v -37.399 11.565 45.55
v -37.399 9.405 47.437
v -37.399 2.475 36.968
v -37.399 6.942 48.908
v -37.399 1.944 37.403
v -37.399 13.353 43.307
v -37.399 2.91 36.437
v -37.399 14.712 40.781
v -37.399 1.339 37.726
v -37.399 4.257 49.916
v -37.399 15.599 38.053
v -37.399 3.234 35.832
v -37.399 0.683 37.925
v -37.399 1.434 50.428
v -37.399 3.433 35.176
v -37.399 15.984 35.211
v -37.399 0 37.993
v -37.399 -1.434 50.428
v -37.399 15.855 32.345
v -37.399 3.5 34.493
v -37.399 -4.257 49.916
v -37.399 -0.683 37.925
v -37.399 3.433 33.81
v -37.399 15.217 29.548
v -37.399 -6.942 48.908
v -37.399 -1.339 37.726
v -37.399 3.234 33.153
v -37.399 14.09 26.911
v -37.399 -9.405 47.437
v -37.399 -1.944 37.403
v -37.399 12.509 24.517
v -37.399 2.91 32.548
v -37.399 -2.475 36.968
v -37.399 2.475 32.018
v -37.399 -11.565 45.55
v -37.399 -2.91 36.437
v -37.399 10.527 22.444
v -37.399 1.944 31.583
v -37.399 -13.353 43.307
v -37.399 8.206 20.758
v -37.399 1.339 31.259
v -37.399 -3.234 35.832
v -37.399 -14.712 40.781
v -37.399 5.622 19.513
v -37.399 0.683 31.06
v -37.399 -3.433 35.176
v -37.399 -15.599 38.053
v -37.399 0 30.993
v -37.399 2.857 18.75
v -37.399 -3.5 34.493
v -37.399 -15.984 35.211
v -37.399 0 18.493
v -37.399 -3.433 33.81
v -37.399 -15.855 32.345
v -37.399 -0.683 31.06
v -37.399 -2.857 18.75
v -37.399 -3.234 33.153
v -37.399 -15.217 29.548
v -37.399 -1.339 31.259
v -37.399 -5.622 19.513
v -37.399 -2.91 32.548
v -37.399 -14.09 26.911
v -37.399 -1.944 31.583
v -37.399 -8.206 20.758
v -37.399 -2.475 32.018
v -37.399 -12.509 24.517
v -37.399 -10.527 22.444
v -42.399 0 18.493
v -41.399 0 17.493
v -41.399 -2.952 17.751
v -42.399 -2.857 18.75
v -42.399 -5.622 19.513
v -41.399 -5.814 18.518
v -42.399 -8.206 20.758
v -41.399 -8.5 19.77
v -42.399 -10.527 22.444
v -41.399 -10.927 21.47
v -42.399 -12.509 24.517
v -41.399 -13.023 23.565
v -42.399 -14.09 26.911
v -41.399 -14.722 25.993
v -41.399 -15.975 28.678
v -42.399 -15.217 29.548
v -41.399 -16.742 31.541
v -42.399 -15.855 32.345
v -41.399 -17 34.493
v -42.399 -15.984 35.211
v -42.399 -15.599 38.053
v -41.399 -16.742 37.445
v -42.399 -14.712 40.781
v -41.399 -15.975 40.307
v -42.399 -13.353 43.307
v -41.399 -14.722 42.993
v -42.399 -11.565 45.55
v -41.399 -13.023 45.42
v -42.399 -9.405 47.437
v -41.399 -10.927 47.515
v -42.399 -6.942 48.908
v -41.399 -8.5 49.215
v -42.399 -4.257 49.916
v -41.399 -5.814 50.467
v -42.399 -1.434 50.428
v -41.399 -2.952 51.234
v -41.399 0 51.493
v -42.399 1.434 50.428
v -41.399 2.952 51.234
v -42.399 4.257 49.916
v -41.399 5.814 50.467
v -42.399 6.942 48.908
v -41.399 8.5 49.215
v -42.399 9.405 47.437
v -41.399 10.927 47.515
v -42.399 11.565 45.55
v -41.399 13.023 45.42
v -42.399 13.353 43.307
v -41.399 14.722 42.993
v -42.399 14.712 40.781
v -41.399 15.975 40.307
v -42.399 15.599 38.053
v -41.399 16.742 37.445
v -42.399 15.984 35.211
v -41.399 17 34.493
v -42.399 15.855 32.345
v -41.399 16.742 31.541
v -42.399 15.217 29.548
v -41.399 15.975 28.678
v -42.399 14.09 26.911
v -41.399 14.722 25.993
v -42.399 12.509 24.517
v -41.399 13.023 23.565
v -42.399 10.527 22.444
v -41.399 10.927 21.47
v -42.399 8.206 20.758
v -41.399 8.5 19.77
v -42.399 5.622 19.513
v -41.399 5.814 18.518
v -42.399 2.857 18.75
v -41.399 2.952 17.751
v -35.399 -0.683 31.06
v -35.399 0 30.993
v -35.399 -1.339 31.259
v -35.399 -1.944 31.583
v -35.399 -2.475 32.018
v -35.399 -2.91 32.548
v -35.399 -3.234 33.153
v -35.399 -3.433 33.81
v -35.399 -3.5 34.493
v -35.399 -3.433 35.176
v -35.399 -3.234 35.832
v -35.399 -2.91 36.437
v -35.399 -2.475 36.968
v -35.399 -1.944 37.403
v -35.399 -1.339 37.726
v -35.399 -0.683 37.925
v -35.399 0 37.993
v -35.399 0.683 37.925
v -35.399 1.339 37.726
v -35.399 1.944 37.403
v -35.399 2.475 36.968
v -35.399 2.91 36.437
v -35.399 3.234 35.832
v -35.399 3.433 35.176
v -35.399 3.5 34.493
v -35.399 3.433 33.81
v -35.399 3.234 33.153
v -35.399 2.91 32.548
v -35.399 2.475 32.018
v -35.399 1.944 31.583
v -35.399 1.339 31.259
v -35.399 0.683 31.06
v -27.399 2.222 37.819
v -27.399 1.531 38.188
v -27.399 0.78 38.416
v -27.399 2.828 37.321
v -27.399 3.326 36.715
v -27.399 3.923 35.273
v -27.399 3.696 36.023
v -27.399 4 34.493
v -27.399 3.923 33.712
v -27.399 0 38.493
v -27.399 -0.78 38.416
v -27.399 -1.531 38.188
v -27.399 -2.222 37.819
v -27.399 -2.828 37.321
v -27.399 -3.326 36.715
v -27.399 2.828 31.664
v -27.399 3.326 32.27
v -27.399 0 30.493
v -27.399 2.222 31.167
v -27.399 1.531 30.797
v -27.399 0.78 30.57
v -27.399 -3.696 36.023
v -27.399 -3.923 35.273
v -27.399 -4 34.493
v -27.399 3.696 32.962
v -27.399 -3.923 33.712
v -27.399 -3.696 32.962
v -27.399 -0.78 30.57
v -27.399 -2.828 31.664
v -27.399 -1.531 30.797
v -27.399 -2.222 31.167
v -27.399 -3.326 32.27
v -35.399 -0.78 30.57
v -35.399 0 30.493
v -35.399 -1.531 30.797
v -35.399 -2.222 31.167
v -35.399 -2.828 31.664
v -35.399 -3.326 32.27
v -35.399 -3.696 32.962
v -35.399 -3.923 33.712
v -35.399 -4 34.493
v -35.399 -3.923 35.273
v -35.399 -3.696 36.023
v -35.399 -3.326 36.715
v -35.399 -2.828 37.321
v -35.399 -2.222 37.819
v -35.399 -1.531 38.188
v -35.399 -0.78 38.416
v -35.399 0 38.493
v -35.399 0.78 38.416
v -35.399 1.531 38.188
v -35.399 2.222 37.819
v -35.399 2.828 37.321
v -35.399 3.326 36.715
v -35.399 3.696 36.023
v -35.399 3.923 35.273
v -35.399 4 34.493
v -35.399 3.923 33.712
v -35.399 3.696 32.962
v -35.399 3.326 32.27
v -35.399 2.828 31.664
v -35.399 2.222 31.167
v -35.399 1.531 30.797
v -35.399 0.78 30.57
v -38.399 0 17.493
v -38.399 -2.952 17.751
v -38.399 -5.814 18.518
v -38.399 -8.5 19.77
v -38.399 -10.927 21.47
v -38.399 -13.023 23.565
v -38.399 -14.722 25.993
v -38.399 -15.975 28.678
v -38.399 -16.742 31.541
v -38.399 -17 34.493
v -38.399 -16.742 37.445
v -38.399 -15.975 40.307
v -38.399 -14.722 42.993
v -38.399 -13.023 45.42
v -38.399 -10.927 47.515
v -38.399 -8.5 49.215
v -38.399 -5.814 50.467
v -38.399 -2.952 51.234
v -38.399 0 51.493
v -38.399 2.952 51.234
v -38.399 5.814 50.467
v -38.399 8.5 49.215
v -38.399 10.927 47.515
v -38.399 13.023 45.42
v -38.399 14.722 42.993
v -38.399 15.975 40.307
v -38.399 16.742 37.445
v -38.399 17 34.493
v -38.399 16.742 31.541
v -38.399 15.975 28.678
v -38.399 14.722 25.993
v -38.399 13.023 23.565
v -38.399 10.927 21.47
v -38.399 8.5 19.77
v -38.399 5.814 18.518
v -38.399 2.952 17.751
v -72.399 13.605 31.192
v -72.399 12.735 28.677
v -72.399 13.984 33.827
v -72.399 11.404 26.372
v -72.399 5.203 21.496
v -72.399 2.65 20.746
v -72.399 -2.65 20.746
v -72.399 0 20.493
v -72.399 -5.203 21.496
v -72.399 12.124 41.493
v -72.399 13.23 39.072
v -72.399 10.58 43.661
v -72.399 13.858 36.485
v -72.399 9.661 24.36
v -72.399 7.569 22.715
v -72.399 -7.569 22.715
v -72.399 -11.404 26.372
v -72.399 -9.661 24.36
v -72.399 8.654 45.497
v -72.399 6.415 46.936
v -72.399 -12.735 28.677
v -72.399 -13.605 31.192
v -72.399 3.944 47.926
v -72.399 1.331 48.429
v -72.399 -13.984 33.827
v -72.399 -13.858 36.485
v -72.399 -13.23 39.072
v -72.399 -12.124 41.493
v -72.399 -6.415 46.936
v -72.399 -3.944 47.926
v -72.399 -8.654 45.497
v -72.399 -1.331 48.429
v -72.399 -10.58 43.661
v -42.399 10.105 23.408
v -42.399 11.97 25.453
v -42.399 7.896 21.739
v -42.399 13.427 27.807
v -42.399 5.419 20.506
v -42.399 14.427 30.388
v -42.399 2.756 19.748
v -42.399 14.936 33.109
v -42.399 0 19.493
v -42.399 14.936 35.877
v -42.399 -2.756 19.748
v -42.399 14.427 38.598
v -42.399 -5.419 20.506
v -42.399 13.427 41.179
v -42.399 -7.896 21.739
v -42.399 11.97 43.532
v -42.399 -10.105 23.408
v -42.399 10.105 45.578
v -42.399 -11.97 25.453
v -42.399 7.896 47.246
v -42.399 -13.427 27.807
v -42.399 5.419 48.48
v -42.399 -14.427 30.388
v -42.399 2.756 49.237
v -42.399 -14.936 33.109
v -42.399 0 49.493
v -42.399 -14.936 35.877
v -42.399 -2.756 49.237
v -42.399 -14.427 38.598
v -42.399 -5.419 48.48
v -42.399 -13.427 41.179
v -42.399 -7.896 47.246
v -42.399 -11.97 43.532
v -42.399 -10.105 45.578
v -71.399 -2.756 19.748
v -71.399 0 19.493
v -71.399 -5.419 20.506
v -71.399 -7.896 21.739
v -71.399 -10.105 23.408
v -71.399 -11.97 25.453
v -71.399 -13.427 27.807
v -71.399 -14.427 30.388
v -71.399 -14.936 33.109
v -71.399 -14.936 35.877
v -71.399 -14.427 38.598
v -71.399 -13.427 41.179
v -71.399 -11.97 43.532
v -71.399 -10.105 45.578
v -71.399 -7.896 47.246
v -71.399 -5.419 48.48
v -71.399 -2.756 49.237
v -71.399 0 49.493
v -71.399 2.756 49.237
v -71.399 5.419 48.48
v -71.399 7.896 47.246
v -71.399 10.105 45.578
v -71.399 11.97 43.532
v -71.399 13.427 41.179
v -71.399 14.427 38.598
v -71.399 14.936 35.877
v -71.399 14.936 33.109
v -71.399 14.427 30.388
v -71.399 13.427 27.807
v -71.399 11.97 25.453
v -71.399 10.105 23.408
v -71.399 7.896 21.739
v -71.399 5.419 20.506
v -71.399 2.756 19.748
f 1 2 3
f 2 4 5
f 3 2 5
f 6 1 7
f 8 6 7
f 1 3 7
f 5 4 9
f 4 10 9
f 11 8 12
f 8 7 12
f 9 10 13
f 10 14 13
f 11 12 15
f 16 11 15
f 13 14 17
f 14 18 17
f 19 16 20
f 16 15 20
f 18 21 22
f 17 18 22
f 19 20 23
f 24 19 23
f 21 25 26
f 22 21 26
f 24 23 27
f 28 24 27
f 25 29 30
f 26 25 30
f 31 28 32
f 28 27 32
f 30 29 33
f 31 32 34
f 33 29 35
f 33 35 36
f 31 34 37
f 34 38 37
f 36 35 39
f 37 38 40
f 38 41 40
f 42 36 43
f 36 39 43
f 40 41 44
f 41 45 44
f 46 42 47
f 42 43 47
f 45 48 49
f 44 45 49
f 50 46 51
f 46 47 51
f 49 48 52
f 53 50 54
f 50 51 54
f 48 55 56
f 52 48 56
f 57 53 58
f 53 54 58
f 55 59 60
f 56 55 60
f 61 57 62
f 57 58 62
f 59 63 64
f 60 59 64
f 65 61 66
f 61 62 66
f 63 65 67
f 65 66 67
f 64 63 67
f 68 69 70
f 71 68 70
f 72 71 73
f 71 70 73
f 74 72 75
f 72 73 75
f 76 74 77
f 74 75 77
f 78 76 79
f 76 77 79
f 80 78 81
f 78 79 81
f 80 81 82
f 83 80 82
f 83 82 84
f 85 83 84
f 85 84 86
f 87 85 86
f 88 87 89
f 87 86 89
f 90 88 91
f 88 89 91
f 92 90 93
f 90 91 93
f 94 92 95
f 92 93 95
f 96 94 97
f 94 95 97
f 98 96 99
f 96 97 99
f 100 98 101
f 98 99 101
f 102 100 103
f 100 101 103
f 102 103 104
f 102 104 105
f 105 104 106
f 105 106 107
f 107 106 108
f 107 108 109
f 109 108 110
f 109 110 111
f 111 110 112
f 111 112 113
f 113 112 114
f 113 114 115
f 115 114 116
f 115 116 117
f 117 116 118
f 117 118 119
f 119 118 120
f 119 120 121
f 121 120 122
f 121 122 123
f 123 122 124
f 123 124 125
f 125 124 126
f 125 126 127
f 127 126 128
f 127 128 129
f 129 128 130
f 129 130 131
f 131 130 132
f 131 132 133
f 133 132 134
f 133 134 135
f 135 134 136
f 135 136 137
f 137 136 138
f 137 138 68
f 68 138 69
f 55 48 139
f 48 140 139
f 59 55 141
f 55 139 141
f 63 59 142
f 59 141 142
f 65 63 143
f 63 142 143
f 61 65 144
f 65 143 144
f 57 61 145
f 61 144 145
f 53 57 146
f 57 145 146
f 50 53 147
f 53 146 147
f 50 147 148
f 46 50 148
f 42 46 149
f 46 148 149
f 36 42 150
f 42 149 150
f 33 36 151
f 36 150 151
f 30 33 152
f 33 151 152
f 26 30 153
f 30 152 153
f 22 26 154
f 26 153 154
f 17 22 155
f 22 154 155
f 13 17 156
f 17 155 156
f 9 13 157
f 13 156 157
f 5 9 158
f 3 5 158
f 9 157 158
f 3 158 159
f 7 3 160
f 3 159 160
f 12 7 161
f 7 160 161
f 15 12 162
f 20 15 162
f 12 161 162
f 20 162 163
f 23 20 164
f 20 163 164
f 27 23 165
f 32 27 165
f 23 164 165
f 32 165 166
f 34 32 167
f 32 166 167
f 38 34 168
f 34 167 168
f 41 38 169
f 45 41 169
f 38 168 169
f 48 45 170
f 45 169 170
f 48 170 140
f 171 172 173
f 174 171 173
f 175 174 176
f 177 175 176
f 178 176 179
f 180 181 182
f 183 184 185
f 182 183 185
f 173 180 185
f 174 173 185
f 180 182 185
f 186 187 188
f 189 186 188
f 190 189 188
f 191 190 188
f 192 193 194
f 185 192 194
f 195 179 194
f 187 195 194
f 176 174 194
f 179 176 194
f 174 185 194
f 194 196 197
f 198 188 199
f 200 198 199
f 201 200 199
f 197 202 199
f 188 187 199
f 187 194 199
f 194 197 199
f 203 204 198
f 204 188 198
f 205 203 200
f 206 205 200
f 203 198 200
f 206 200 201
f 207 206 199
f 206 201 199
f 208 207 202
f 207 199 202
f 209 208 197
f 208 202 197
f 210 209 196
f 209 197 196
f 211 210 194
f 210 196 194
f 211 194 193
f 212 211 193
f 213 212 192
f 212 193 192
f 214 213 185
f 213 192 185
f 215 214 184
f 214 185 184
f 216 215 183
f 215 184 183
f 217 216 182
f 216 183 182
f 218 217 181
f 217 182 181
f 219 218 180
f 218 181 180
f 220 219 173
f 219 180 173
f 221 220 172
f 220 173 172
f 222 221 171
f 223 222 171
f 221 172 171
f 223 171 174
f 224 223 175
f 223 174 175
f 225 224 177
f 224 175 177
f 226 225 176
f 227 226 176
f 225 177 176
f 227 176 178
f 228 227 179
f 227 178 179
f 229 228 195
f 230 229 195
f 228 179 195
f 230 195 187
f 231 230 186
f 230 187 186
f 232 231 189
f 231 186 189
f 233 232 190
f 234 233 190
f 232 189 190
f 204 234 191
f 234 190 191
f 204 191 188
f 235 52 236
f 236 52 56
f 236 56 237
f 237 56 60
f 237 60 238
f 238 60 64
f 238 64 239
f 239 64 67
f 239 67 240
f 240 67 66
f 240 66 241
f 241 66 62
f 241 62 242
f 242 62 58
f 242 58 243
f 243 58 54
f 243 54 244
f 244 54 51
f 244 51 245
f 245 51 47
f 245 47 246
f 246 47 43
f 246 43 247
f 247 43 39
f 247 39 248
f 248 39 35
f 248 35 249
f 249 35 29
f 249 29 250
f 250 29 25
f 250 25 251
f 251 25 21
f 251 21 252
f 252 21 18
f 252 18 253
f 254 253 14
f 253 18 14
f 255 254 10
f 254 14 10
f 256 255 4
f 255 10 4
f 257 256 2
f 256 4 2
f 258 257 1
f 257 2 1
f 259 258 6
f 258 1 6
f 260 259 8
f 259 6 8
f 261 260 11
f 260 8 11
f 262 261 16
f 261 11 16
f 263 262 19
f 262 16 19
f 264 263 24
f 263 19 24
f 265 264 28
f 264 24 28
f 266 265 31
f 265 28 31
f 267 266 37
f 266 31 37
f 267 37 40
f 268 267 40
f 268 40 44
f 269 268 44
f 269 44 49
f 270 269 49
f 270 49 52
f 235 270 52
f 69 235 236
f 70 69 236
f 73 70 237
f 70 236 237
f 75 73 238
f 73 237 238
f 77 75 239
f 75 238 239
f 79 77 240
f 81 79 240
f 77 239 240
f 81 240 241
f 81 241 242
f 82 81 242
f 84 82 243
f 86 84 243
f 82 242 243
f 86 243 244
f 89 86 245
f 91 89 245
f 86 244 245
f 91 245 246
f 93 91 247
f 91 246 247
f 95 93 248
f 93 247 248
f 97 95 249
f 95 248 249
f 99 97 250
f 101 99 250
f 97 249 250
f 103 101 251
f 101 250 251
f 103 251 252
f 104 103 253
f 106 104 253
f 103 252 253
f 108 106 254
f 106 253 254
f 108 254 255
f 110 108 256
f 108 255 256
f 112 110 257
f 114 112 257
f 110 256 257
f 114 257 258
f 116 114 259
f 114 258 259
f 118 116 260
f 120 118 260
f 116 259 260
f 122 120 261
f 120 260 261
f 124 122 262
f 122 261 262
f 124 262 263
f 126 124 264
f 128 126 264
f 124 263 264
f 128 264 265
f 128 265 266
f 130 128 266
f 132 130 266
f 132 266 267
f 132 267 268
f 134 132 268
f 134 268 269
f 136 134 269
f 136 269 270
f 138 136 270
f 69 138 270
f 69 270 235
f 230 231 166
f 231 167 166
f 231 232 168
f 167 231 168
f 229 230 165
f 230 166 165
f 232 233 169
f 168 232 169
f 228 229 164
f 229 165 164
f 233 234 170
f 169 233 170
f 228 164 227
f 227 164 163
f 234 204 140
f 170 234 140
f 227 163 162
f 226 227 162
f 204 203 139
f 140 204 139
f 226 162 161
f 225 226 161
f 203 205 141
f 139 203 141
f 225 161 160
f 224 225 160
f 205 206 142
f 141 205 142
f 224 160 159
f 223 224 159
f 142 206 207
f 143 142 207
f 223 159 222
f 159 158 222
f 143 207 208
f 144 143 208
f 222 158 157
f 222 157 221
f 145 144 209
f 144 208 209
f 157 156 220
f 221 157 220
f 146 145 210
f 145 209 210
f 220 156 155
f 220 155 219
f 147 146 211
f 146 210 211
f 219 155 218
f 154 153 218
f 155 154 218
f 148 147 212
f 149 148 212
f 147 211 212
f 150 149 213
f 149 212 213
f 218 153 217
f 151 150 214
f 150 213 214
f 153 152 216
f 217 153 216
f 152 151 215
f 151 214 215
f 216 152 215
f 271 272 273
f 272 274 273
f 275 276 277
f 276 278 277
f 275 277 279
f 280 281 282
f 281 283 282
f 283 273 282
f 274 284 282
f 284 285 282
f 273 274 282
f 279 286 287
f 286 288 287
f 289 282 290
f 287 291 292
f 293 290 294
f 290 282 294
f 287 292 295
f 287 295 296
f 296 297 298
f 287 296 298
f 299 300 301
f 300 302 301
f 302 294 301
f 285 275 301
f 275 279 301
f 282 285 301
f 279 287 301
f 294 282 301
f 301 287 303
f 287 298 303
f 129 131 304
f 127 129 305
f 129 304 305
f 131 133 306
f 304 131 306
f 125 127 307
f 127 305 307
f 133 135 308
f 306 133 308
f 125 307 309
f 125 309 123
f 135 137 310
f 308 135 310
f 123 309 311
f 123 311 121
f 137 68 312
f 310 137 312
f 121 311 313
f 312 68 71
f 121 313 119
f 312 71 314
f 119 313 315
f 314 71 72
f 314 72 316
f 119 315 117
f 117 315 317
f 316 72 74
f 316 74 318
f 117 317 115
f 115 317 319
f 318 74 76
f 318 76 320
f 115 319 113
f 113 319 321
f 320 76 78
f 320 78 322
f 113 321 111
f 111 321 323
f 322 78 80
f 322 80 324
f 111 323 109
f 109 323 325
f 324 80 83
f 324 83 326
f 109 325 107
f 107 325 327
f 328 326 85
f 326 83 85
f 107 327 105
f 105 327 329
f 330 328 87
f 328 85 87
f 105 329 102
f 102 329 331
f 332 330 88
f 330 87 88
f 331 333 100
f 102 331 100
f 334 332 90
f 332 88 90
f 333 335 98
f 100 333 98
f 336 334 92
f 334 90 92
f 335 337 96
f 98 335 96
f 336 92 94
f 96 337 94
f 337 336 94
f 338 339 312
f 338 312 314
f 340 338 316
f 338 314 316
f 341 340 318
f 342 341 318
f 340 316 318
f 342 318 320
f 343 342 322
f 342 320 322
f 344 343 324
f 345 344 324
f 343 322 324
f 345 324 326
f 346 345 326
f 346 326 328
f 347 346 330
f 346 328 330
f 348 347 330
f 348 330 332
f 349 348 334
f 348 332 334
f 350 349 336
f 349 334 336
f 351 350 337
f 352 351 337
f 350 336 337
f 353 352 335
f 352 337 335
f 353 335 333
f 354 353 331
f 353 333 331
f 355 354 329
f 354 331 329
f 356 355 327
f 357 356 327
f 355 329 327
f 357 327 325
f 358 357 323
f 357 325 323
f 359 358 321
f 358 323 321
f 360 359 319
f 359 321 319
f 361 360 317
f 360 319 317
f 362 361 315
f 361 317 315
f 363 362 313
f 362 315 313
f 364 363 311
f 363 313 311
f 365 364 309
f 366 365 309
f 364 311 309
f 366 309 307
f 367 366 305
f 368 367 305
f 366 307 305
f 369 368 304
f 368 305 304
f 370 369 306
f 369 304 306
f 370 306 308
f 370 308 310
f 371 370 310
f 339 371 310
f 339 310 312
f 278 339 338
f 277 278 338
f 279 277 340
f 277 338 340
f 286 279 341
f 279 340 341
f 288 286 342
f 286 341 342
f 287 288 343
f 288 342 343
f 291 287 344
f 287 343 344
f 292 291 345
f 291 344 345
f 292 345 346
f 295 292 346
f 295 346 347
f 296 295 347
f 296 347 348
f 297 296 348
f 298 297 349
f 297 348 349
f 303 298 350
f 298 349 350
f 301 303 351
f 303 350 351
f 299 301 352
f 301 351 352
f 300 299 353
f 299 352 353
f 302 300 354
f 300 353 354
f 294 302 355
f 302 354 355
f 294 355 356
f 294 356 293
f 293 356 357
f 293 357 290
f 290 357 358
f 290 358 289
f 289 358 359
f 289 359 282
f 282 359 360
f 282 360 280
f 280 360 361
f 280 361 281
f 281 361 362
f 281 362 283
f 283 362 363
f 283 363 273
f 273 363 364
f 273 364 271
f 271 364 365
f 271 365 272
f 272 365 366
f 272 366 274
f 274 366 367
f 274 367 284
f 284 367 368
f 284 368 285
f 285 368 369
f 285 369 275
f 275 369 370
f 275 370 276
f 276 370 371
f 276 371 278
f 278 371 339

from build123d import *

# Parameters (mm, degrees)
F2_SIZE = 1


with BuildPart() as f1:
    # F0 (on Front) → F1 (revolve)
    with BuildSketch(Plane.XZ):
        Polygon((-72.3989970755, 34.4926873816), (-72.3989970755, 19.4926873816), (-42.3989970755, 19.4926873816), (-42.3989970755, 17.4926873816), (-37.3989970755, 17.4926873816), (-37.3989970755, 30.4926873816), (-37.3989970755, 30.9926873816), (-35.3989970755, 30.9926873816), (-35.3989970755, 30.4926873816), (-27.3989970755, 30.4926873816), (-27.3989970755, 34.4926873816), align=None)
    revolve(axis=Axis((-49.8989970755, 0, 34.4926873816), (-1, 0, 0)))

    # F2
    f2_edges = [f1.edges().sort_by_distance(p)[0] for p in [
        (-37.398997, 0, 51.492687),
        (-42.398997, 0, 51.492687),
        (-72.398997, 0, 49.492687),
    ]]
    chamfer(f2_edges, length=F2_SIZE)


solid = f1.part
